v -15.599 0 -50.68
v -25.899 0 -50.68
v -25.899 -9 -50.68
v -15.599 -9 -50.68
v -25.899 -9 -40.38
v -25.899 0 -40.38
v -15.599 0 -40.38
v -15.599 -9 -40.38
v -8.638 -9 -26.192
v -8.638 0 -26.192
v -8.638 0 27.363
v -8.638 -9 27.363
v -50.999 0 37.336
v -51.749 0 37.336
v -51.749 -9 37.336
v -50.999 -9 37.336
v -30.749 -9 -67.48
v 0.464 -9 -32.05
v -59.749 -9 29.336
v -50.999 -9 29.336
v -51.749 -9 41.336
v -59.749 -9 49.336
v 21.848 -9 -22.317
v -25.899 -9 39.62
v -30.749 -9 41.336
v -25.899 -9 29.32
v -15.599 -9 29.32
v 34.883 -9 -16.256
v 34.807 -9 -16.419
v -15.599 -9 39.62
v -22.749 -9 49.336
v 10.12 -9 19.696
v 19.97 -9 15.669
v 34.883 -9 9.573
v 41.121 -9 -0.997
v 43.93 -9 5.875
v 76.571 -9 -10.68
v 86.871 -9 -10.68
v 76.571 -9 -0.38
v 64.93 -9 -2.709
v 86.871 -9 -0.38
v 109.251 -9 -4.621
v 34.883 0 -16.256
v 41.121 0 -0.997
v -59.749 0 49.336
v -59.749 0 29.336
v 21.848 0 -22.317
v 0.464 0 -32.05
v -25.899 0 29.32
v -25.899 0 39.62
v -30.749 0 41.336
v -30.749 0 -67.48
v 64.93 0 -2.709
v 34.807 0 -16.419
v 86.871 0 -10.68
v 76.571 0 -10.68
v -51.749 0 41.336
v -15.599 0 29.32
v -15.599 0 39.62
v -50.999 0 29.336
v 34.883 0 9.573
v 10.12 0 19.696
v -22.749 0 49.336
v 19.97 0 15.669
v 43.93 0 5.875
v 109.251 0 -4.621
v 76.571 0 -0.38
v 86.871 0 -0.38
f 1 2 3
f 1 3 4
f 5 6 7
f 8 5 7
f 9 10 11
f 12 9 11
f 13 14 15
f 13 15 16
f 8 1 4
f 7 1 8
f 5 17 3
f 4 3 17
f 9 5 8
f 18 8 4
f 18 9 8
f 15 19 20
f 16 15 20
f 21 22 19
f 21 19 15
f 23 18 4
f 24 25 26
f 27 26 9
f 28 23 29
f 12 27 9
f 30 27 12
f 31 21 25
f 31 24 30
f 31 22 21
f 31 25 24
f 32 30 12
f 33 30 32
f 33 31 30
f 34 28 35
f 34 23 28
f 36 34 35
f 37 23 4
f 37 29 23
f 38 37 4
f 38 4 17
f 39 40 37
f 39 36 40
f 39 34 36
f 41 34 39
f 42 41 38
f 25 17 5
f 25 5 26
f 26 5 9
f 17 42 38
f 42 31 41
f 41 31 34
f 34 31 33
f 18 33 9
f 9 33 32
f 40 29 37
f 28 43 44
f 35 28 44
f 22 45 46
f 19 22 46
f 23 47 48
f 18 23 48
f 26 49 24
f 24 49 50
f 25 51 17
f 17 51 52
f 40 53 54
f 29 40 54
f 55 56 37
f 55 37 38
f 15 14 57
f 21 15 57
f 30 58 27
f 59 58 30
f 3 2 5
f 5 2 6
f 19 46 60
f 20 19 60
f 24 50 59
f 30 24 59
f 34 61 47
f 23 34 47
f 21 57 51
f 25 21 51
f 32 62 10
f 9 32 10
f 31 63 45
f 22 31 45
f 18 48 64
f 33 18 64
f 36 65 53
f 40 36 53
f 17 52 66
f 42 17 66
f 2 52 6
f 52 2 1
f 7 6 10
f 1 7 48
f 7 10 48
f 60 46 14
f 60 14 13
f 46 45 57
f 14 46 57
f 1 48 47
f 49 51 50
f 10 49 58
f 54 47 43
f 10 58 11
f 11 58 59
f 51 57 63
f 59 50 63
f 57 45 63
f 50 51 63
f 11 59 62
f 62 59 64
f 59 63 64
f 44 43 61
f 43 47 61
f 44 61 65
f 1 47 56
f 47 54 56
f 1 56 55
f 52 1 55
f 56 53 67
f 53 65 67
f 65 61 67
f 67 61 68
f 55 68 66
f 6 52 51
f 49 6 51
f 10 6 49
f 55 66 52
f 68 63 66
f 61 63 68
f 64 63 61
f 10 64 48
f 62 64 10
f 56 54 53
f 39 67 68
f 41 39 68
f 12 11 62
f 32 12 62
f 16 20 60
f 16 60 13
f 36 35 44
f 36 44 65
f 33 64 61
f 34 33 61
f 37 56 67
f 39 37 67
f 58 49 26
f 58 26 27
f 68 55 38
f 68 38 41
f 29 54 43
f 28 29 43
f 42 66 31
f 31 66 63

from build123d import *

# Parameters (mm, degrees)
F0_W     = 10.3
F0_H     = 10.3
F0_W_2   = 0.75
F0_H_2   = 8
F1_DEPTH = 9


with BuildPart() as f1:
    # F0 (on Front) → F1 (new body)
    with BuildSketch(Plane.XZ):
        Polygon((-22.7488241771, 49.3360479977), (-30.7488241771, 49.3360479977), (-30.7488241771, 41.3360479977), (-30.7488241771, -60.2917829884), (-30.7488241771, -67.4802789781), (109.2511758229, -4.6212578508), align=None)
        with Locations((-20.7488241771, -45.5300207496)):
            Rectangle(F0_W, F0_H, mode=Mode.SUBTRACT)
        with Locations((-20.7488241771, 34.4699792504)):
            Rectangle(F0_W, F0_H, mode=Mode.SUBTRACT)
        Polygon((-8.6376664854, -26.1920627463), (-8.6376664854, 27.3630689768), (10.1197385162, 19.6956520177), (19.9698888285, 15.6692310097), (34.8834536025, 9.57305089), (43.9300421098, 5.8750998068), (64.9299837446, -2.708993175), (34.8072479351, -16.4188460197), (21.847787114, -22.3171250448), (0.4639824944, -32.0496014191), (-8.6376664854, -36.1920627463), align=None, mode=Mode.SUBTRACT)
        with Locations((81.7206834825, -5.5300207496)):
            Rectangle(F0_W, F0_H, mode=Mode.SUBTRACT)
        Polygon((19.9698888285, 15.6692310097), (10.1197385162, 19.6956520177), (-8.6376664854, -26.1920627463), (-8.6376664854, -36.1920627463), (0.4639824944, -32.0496014191), align=None)
        Polygon((-30.7488241771, 41.3360479977), (-30.7488241771, 49.3360479977), (-59.7488241771, 49.3360479977), (-59.7488241771, 29.3360479977), (-51.7488241771, 29.3360479977), (-51.7488241771, 37.3360479977), (-51.7488241771, 41.3360479977), align=None)
        Polygon((43.9300421098, 5.8750998068), (34.8834536025, 9.57305089), (21.847787114, -22.3171250448), (34.8072479351, -16.4188460197), (34.8834536025, -16.2562809986), (41.1210870837, -0.9966677438), align=None)
        with Locations((-51.3738241771, 33.3360479977)):
            Rectangle(F0_W_2, F0_H_2)
    extrude(amount=F1_DEPTH)


solid = f1.part
